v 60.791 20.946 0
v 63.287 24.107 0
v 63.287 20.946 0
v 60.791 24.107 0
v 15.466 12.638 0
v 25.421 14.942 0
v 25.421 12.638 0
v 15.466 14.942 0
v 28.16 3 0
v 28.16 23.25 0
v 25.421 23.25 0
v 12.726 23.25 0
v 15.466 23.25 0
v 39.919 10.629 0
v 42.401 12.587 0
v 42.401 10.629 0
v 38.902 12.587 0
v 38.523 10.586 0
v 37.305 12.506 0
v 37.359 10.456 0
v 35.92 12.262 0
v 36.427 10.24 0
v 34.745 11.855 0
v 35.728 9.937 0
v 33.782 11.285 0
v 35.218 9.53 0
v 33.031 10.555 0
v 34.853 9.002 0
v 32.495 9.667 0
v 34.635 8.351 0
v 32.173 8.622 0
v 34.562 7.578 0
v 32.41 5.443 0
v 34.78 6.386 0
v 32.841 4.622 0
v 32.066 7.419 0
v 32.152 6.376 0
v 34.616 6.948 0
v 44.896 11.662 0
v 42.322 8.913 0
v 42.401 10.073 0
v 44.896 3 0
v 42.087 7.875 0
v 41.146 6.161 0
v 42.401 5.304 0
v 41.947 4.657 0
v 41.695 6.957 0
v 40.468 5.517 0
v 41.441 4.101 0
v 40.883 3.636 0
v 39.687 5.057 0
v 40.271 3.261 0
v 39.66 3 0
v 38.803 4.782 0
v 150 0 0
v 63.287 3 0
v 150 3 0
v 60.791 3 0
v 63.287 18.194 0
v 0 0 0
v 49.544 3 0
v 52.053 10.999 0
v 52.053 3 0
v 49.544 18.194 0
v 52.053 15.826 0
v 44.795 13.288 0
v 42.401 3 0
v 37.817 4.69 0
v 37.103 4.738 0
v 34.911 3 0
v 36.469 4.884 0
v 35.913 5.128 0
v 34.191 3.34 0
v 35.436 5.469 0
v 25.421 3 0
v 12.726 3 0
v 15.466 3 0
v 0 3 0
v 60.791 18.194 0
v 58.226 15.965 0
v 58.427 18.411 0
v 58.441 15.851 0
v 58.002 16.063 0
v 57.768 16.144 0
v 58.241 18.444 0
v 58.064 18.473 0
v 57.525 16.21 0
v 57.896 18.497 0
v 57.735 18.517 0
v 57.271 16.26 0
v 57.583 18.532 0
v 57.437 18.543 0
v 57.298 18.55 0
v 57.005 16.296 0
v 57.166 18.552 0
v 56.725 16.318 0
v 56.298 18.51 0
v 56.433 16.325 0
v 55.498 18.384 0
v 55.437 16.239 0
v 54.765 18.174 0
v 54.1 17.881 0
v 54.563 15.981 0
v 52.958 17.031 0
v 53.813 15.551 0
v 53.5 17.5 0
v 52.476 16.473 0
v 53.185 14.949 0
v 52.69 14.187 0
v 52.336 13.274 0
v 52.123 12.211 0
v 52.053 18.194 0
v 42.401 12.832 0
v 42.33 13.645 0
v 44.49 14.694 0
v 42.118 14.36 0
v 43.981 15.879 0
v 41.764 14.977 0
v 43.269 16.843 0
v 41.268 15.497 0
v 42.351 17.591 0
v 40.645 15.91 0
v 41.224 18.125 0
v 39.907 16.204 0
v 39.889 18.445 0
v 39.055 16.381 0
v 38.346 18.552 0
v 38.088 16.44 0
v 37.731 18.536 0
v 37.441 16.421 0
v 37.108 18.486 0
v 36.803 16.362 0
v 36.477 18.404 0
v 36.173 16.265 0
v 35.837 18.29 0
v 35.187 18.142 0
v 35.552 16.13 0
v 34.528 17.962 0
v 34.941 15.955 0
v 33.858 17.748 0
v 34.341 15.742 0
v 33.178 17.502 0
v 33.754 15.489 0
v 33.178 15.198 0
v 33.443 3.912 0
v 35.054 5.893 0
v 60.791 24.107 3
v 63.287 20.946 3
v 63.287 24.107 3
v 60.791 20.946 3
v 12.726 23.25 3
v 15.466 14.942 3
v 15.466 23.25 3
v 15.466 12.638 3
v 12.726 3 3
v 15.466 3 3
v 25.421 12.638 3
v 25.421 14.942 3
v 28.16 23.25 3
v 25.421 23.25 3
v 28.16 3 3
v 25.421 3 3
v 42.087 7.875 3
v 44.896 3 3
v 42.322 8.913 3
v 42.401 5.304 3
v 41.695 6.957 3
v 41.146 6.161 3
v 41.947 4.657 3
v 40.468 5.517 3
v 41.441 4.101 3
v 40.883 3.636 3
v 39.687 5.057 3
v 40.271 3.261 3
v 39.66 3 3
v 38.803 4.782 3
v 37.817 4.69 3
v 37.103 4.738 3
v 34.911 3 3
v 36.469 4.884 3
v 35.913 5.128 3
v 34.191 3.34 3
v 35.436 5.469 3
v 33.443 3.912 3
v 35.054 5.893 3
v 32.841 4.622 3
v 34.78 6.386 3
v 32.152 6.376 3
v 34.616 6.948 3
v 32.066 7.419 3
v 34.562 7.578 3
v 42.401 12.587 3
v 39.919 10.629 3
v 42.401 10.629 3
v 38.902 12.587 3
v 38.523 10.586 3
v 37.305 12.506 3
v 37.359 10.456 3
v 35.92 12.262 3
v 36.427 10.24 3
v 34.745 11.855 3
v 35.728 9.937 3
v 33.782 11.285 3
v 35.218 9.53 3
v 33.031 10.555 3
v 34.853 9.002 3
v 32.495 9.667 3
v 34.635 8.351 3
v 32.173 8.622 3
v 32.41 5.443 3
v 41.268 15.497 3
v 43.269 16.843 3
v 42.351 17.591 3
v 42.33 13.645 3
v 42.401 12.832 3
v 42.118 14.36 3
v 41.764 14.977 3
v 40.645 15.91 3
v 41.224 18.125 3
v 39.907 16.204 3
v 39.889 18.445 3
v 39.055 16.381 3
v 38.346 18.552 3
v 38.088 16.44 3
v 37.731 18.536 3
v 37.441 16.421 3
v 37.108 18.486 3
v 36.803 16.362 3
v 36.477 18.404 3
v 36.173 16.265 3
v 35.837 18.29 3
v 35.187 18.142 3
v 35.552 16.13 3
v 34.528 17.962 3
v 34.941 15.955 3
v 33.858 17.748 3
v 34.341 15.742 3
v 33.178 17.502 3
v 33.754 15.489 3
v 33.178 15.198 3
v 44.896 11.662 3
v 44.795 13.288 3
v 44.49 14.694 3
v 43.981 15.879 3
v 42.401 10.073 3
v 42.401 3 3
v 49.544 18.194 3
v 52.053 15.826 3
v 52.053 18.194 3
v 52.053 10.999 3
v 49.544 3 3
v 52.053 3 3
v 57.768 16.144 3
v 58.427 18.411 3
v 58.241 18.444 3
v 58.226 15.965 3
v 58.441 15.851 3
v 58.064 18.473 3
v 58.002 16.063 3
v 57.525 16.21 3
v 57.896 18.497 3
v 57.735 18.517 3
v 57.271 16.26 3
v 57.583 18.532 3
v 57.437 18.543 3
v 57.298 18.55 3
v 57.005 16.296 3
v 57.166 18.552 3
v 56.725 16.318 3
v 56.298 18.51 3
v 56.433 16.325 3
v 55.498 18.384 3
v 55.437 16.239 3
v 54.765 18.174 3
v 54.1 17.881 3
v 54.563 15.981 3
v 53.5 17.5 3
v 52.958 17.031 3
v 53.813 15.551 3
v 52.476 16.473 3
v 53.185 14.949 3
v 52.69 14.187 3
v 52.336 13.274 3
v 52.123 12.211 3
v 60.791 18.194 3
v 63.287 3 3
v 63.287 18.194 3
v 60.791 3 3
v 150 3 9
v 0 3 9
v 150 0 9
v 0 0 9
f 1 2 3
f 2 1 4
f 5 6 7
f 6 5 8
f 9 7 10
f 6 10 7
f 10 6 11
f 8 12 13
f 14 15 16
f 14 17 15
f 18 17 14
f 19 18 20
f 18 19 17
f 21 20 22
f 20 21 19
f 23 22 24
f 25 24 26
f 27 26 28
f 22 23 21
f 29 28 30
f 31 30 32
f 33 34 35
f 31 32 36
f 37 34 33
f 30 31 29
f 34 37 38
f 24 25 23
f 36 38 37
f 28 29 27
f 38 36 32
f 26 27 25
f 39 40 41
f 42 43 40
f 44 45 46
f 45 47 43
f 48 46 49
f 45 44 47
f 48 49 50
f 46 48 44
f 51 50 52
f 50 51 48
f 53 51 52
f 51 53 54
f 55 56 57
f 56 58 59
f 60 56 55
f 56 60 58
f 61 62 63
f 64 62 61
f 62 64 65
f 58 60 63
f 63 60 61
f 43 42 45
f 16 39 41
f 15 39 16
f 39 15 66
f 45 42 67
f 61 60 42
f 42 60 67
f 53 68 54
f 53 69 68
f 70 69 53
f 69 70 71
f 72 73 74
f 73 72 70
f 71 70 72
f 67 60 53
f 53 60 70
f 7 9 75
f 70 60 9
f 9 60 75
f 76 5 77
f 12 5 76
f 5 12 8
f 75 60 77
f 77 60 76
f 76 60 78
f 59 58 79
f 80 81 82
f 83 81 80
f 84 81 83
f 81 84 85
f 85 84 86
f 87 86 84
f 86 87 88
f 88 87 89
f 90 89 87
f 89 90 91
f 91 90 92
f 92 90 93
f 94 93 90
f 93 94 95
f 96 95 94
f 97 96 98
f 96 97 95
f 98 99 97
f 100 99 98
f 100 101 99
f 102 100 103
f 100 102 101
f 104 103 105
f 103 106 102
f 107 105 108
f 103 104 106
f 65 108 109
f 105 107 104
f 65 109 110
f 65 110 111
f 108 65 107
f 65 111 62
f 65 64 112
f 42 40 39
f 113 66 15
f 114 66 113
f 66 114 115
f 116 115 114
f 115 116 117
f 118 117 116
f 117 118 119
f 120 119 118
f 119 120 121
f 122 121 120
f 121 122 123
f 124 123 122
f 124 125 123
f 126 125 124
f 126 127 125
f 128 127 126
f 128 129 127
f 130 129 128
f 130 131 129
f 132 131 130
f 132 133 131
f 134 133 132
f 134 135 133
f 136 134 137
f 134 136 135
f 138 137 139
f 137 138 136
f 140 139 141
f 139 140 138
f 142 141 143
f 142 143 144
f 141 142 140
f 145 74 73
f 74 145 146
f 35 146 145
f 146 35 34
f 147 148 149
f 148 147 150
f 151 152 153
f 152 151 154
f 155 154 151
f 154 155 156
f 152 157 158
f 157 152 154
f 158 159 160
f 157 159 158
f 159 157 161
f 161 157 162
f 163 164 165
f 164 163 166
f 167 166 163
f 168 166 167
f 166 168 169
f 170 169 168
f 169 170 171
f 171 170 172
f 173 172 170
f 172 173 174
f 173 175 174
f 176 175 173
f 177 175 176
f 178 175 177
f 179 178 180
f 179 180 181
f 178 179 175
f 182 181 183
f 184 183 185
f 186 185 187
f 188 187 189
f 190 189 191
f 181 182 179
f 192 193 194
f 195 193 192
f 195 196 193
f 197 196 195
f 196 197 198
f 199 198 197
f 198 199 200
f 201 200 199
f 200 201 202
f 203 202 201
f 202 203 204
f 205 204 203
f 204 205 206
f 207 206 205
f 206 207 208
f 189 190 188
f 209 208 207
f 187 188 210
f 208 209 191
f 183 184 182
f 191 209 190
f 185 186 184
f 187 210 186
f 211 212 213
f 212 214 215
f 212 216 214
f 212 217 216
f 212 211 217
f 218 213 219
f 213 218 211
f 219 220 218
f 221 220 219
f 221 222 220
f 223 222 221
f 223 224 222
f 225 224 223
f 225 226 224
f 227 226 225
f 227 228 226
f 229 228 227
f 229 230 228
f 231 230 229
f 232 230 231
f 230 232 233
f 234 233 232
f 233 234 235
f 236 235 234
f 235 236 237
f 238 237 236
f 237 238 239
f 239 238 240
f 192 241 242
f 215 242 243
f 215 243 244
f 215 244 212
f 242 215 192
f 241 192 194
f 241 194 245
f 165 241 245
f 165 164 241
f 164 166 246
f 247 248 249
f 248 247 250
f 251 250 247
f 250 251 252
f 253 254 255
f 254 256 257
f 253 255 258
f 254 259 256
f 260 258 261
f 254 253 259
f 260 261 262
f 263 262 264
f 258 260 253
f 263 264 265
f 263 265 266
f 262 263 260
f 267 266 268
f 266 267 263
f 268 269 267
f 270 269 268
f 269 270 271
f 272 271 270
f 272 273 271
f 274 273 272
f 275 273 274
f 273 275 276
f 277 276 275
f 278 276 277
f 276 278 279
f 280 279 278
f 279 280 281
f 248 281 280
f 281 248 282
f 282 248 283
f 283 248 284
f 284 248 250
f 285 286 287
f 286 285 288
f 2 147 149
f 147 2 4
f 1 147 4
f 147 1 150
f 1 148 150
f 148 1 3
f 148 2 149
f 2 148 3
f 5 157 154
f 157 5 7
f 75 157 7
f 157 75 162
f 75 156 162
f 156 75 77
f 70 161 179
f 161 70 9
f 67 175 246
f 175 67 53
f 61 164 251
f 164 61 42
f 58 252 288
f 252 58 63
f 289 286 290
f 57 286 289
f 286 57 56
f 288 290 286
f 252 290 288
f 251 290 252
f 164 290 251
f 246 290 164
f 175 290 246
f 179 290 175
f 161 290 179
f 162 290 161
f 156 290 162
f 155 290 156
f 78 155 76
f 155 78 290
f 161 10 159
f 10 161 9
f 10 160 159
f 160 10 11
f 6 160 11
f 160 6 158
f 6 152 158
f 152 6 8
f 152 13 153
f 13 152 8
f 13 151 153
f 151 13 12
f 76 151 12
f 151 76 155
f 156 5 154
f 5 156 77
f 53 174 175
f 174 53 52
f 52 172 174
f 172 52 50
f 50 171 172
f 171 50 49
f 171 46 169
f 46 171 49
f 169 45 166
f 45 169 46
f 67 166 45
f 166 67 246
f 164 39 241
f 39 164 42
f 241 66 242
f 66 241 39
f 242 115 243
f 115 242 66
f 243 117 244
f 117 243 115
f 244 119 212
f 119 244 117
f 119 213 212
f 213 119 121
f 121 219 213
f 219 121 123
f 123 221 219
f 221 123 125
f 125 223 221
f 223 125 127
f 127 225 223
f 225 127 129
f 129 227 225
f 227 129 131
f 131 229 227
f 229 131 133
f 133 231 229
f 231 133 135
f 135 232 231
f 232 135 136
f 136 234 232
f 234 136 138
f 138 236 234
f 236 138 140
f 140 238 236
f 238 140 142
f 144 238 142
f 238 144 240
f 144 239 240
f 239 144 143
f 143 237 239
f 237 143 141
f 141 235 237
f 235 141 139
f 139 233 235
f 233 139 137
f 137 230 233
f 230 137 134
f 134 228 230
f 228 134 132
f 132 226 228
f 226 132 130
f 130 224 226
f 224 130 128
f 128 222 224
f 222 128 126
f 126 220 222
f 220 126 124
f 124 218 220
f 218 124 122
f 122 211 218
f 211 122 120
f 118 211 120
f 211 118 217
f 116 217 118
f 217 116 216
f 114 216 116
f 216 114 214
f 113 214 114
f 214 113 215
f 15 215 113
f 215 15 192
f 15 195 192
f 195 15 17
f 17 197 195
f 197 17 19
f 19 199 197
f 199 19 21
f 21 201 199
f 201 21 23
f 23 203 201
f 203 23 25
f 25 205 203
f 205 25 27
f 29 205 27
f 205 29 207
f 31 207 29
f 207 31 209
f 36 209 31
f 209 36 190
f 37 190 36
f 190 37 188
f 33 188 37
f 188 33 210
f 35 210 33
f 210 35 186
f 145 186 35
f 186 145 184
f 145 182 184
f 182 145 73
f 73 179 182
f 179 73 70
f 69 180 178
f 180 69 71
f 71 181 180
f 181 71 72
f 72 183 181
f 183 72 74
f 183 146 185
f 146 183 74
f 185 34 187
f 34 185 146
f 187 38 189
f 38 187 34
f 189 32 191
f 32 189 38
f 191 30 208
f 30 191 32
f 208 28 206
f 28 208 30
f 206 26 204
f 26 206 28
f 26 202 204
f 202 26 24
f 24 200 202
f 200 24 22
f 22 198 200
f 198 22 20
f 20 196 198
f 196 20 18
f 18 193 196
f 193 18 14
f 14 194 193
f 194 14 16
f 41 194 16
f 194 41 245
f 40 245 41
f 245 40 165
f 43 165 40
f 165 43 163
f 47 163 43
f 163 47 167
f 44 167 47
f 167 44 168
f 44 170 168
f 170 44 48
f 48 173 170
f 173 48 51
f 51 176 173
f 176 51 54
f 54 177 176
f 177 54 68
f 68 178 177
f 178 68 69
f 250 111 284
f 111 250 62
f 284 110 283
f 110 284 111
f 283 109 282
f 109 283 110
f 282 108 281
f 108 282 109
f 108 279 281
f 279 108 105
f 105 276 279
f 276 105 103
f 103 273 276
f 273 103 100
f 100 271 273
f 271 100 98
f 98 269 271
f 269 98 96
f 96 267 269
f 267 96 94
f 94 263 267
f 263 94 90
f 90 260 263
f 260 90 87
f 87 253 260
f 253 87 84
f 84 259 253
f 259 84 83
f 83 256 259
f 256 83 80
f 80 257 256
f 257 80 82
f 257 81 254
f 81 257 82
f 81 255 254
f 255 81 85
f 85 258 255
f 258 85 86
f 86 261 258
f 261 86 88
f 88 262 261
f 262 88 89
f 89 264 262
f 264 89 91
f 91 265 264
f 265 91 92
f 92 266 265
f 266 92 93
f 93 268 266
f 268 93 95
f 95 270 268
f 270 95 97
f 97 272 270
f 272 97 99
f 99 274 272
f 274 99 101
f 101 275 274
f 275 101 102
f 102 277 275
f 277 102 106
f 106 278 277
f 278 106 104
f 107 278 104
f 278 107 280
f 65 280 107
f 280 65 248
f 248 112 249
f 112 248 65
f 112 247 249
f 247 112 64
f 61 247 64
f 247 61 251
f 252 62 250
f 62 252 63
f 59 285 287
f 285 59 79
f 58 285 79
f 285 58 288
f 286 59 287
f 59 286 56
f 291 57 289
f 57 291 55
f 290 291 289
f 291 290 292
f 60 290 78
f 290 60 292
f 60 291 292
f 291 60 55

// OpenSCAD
translate([10, 3, 0])
linear_extrude(height=3)
    text("Hari", 20, "Cascadia Code Semibold");

cube([150, 3, 9]);
